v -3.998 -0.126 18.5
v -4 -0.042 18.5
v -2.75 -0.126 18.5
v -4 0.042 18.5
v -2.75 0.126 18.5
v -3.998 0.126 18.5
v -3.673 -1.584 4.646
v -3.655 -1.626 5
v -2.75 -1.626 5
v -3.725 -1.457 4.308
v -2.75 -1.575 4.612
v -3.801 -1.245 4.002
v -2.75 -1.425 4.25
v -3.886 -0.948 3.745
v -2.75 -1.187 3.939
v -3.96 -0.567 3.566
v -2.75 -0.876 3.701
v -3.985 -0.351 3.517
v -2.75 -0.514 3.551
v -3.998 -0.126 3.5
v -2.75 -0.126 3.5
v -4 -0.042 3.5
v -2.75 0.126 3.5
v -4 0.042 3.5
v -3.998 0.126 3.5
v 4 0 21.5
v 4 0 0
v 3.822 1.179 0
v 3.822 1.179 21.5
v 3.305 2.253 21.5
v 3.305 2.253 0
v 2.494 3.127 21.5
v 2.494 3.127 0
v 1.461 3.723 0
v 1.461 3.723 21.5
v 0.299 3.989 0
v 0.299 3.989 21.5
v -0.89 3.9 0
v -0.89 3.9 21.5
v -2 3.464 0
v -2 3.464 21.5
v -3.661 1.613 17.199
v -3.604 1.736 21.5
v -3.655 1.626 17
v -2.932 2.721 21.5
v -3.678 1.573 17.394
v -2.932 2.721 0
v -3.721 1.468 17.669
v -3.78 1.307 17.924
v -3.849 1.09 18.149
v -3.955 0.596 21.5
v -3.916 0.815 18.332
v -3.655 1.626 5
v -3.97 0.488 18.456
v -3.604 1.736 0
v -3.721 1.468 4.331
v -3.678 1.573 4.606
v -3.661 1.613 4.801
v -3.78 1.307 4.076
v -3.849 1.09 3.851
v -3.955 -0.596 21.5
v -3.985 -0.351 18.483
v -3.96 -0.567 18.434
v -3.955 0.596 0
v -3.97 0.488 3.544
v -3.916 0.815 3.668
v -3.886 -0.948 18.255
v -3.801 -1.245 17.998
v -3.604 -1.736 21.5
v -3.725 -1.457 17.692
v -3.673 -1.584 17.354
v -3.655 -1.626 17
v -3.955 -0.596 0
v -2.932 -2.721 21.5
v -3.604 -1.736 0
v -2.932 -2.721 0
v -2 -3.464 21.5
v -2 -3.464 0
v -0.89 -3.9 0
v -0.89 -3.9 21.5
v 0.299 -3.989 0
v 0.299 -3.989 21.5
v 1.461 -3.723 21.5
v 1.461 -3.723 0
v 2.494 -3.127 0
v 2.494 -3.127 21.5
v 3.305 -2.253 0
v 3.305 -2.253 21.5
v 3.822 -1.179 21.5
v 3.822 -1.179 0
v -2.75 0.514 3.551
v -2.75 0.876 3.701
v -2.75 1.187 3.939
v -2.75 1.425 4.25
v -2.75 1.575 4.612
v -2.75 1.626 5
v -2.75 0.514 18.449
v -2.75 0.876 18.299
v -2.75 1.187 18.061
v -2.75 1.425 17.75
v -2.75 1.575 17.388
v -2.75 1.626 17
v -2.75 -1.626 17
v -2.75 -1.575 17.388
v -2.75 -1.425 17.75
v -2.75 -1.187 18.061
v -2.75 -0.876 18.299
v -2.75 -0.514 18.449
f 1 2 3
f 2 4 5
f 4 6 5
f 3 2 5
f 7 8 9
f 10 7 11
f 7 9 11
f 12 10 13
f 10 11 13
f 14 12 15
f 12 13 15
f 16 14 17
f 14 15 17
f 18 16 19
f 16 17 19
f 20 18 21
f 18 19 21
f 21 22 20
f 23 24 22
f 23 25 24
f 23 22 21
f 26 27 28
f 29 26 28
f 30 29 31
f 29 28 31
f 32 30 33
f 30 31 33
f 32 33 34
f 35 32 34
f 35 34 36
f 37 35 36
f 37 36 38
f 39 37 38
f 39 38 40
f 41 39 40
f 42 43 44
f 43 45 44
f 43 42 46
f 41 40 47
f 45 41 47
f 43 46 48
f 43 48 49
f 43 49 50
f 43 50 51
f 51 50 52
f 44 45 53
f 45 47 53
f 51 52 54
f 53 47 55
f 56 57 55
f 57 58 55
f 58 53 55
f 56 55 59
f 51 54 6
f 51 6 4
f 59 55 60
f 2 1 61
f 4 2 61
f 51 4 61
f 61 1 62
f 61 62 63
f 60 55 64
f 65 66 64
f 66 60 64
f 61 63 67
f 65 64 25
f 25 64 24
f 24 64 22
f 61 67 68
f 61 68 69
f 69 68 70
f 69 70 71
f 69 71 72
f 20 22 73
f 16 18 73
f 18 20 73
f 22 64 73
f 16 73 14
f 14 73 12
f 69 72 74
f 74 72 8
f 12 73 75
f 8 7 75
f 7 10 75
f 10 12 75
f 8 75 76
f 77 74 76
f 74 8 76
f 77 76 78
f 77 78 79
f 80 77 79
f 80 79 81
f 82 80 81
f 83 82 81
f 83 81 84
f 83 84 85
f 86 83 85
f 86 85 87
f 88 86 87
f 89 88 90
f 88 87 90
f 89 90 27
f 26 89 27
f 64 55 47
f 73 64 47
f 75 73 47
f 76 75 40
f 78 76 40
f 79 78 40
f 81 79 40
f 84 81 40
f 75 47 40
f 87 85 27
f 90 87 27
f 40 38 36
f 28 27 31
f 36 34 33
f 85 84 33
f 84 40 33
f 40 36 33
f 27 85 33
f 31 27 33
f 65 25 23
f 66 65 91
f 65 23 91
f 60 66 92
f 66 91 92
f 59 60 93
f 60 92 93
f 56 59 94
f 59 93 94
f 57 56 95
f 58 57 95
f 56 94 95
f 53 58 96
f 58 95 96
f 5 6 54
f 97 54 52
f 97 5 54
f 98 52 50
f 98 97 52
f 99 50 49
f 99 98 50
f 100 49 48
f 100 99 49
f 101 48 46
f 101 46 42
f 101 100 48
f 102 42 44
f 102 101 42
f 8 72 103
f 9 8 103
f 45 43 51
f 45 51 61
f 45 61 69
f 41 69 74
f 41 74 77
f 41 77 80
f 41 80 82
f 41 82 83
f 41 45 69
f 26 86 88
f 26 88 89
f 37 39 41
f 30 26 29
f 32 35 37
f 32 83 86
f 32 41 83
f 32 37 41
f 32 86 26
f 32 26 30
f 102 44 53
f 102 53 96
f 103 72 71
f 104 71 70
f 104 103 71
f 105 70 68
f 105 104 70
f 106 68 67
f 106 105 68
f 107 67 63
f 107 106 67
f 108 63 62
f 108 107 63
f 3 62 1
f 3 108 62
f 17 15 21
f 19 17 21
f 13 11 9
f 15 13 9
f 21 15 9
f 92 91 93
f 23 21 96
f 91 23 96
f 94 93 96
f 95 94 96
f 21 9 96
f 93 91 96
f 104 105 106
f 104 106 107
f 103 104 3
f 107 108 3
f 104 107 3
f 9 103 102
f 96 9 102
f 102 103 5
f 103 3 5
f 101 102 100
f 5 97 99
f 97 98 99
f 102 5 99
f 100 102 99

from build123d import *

# Parameters (mm, degrees)
SKETCH1_R           = 4
BOSS_EXTRUDE1_DEPTH = 21.5
CUT_EXTRUDE1_START  = -3
SKETCH2_W           = 2.50000008
SKETCH2_H           = 3.251715676
CUT_EXTRUDE1_DEPTH  = 15
FILLET2_R           = 1.5
FILLET3_R           = 1.5


with BuildPart() as part:
    # Sketch1 → Boss-Extrude1 (new body)
    with BuildSketch(Plane.XY):
        Circle(SKETCH1_R)
    extrude(amount=BOSS_EXTRUDE1_DEPTH)

    # Sketch2 → Cut-Extrude1 (cut)
    with BuildSketch(Plane.XY.offset(21.5).offset(CUT_EXTRUDE1_START)):
        with Locations((-4, 0)):
            Rectangle(SKETCH2_W, SKETCH2_H)
    extrude(amount=-CUT_EXTRUDE1_DEPTH, mode=Mode.SUBTRACT)

    # Fillet2
    fillet2_edges = [part.edges().sort_by_distance(p)[0] for p in [
        (-3.202333166, -1.625857838, 3.5),
        (-3.202333166, 1.625857838, 3.5),
    ]]
    fillet(fillet2_edges, radius=FILLET2_R)

    # Fillet3
    fillet3_edges = [part.edges().sort_by_distance(p)[0] for p in [
        (-3.202333166, 1.625857838, 18.5),
        (-3.202333166, -1.625857838, 18.5),
    ]]
    fillet(fillet3_edges, radius=FILLET3_R)


solid = part.part
